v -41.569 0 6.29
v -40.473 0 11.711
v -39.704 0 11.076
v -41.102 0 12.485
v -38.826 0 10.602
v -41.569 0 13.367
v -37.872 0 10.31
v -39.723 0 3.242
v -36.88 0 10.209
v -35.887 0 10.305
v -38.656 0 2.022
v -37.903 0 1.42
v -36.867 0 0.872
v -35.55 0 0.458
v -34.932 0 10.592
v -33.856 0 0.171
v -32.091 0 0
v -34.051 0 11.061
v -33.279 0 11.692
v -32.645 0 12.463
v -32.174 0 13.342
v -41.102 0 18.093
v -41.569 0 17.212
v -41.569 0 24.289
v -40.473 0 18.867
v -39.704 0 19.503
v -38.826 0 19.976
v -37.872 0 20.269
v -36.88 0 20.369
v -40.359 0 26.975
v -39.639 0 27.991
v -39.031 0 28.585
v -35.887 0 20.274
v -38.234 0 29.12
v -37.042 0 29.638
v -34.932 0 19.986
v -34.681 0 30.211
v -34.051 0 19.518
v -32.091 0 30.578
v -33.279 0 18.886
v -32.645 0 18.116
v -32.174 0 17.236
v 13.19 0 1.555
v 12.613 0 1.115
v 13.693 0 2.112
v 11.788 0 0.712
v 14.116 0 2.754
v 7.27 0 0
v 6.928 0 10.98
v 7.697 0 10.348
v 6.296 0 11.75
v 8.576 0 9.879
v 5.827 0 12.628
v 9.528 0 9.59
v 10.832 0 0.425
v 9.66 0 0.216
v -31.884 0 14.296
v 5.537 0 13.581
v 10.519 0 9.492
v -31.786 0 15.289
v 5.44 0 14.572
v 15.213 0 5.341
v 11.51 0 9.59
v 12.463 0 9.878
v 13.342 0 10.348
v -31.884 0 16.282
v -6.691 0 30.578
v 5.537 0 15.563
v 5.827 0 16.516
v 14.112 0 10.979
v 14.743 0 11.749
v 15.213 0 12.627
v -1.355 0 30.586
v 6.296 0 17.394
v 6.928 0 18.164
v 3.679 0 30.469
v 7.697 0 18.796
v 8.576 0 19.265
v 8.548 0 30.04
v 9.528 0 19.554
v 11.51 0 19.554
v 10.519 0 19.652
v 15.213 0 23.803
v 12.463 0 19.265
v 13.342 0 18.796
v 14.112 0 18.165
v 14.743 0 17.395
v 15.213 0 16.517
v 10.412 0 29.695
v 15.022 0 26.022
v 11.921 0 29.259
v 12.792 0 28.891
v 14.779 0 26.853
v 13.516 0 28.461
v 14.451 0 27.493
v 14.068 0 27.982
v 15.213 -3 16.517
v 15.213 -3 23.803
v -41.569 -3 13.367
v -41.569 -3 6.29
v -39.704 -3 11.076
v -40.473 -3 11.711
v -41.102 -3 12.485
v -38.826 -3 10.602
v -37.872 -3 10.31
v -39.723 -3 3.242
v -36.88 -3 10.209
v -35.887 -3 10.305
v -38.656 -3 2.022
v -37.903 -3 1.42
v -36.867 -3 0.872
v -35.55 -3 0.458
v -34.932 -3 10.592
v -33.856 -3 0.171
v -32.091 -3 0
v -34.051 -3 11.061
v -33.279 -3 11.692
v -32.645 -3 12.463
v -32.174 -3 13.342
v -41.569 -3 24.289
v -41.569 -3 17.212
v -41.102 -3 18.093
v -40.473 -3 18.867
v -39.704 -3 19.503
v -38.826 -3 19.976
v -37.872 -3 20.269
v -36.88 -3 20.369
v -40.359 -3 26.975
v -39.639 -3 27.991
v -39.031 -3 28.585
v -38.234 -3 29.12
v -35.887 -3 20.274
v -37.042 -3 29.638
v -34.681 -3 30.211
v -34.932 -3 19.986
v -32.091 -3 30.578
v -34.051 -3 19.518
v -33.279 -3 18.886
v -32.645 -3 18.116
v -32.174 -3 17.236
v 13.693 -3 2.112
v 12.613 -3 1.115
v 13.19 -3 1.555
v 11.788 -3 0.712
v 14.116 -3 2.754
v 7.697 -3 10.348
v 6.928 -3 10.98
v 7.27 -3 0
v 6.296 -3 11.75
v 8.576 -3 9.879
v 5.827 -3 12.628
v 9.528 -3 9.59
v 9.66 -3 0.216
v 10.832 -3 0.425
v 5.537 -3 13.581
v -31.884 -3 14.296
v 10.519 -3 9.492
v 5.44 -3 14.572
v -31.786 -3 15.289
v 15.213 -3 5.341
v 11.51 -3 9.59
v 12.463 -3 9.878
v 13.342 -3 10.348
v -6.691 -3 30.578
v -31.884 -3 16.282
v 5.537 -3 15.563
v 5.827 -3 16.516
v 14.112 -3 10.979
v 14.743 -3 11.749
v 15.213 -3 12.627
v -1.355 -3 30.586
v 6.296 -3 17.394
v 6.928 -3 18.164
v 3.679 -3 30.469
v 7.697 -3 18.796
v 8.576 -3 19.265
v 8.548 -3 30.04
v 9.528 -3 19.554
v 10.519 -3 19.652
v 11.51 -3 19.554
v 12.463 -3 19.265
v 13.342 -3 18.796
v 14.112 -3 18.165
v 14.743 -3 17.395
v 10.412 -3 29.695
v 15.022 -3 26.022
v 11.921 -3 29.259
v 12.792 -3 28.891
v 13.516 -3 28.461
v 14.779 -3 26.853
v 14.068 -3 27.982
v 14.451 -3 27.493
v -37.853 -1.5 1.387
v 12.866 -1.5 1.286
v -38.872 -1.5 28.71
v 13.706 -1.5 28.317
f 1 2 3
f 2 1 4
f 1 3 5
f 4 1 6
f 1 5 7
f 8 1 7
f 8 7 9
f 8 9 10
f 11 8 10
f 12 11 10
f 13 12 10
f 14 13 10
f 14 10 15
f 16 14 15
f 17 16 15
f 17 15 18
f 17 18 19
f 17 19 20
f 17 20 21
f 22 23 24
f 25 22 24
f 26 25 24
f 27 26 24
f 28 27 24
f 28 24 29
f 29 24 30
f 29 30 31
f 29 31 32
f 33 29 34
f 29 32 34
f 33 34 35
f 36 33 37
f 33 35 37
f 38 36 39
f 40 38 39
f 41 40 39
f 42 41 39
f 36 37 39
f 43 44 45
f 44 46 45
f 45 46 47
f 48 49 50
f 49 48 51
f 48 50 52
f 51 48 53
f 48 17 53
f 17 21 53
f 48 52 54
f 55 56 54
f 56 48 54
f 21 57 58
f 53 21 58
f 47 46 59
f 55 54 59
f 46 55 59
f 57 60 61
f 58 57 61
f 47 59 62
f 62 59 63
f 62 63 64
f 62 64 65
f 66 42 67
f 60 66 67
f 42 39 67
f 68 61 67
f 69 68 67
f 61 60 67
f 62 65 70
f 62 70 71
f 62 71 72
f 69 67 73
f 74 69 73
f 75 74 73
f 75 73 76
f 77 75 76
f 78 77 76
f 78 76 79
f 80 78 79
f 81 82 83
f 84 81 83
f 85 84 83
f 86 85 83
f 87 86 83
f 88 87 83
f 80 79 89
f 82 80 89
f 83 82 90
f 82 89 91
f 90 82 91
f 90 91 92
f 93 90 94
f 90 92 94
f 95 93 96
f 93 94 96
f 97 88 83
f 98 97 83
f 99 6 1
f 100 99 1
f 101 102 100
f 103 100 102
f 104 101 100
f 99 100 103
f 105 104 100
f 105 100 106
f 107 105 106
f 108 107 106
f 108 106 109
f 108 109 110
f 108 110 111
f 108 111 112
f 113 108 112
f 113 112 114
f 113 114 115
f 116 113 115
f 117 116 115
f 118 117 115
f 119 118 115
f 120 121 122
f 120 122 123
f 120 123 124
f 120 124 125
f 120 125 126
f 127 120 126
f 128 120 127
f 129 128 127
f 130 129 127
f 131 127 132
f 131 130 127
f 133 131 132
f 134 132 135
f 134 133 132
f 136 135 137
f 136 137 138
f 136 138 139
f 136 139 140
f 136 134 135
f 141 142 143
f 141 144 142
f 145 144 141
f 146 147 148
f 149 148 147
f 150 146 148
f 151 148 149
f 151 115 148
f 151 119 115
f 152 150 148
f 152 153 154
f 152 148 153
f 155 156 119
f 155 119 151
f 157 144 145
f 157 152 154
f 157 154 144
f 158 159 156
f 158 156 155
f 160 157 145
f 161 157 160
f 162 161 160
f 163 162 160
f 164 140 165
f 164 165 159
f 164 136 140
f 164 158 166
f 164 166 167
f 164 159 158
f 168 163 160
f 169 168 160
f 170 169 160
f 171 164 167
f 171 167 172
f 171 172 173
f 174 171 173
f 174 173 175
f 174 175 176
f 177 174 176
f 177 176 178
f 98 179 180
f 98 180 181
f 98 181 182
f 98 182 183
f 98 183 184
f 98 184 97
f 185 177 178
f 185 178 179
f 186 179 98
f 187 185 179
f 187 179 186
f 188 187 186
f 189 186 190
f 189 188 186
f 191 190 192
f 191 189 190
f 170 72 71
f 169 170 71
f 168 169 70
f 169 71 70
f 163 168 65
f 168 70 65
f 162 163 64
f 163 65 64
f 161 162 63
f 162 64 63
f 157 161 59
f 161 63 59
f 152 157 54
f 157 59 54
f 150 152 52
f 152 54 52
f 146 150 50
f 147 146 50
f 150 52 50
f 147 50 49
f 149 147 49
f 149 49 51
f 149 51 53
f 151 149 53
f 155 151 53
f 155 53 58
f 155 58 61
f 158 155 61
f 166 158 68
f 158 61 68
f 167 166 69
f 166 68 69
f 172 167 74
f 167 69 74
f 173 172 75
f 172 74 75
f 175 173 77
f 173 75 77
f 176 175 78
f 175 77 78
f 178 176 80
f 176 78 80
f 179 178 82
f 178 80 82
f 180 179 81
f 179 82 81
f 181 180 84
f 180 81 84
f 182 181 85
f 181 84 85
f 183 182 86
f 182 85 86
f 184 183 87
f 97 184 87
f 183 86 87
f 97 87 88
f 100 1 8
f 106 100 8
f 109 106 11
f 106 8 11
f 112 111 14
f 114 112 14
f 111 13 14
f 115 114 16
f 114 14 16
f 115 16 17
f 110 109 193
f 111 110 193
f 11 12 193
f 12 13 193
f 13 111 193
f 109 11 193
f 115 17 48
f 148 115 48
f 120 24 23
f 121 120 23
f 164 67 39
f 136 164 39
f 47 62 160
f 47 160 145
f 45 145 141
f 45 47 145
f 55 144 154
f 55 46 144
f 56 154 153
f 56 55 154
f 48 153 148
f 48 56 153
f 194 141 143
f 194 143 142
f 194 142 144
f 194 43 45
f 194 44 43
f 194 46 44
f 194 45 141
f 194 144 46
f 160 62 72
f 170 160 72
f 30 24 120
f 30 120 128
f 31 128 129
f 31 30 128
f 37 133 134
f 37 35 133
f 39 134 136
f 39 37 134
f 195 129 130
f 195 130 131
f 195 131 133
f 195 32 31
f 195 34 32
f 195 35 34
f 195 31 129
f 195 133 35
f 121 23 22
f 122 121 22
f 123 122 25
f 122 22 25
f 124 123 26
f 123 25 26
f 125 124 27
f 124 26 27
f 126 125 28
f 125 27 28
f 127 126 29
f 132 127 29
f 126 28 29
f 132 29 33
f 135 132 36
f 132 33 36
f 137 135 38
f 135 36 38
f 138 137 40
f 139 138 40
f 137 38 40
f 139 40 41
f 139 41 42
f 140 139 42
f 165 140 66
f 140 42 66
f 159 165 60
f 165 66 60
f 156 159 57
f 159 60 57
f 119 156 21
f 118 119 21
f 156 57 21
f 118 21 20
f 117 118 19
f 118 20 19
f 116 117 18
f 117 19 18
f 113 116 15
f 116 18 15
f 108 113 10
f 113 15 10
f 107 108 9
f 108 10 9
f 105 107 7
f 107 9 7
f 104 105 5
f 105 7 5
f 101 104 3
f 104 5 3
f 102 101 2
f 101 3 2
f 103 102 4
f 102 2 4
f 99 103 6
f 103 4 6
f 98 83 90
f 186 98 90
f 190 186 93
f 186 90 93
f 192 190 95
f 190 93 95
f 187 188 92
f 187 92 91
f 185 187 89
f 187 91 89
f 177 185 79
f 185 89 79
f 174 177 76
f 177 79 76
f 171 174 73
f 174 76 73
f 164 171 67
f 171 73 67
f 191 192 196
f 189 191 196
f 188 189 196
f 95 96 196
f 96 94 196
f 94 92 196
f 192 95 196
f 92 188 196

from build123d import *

# Parameters (mm, degrees)
F1_DEPTH = 3


with BuildPart() as f1:
    # F0 (on Front) → F1 (new body)
    with BuildSketch(Plane.XZ):
        with BuildLine():
            ThreePointArc((-41.5685183068, 17.2115741473), (-31.7863073381, 15.2891766842), (-41.5685183068, 13.3667792212))
            Line((-41.5685183068, 13.3667792212), (-41.5685183068, 6.2897060804))
            add(Edge.make_bspline(
                [(-41.5685183068, 6.2897060804), (-40.5110451617, 4.3618677361), (-38.4157281513, 0.5419764273), (-34.1862913757, 0.1795269801), (-32.091384023, 0)],
                knots=[0, 0, 0, 0, 0.5046840835, 1, 1, 1, 1], degree=3))
            Line((-32.091384023, 0), (7.2702049994, 0))
            add(Edge.make_bspline(
                [(15.2129016184, 5.3413121865), (14.6447493994, 3.7606222596), (13.4476780972, 0.4301793154), (9.3978891034, 0.1481650631), (7.2702049994, 0)],
                knots=[0, 0, 0, 0, 0.4746185277, 1, 1, 1, 1], degree=3))
            Line((15.2129016184, 5.3413121865), (15.2129016184, 12.6273036262))
            ThreePointArc((15.2129016184, 12.6273036262), (5.4398618144, 14.5719828795), (15.2129016184, 16.5166621327))
            Line((15.2129016184, 16.5166621327), (15.2129016184, 23.8026535724))
            add(Edge.make_bspline(
                [(15.2129016184, 23.8026535724), (15.1610136829, 25.4929601247), (15.0013770651, 30.6932984806), (2.0501826306, 30.6246729843), (-6.691384023, 30.5783533685)],
                knots=[0, 0, 0, 0, 0.3250378027, 1, 1, 1, 1], degree=3))
            Line((-6.691384023, 30.5783533685), (-32.091384023, 30.5783533685))
            add(Edge.make_bspline(
                [(-41.5685183068, 24.288647288), (-40.9100897642, 25.9794911706), (-39.4843435822, 29.6408060352), (-34.6780612652, 30.2503206867), (-32.091384023, 30.5783533685)],
                knots=[0, 0, 0, 0, 0.4618132953, 1, 1, 1, 1], degree=3))
            Line((-41.5685183068, 24.288647288), (-41.5685183068, 17.2115741473))
        make_face()
    extrude(amount=F1_DEPTH)


solid = f1.part
